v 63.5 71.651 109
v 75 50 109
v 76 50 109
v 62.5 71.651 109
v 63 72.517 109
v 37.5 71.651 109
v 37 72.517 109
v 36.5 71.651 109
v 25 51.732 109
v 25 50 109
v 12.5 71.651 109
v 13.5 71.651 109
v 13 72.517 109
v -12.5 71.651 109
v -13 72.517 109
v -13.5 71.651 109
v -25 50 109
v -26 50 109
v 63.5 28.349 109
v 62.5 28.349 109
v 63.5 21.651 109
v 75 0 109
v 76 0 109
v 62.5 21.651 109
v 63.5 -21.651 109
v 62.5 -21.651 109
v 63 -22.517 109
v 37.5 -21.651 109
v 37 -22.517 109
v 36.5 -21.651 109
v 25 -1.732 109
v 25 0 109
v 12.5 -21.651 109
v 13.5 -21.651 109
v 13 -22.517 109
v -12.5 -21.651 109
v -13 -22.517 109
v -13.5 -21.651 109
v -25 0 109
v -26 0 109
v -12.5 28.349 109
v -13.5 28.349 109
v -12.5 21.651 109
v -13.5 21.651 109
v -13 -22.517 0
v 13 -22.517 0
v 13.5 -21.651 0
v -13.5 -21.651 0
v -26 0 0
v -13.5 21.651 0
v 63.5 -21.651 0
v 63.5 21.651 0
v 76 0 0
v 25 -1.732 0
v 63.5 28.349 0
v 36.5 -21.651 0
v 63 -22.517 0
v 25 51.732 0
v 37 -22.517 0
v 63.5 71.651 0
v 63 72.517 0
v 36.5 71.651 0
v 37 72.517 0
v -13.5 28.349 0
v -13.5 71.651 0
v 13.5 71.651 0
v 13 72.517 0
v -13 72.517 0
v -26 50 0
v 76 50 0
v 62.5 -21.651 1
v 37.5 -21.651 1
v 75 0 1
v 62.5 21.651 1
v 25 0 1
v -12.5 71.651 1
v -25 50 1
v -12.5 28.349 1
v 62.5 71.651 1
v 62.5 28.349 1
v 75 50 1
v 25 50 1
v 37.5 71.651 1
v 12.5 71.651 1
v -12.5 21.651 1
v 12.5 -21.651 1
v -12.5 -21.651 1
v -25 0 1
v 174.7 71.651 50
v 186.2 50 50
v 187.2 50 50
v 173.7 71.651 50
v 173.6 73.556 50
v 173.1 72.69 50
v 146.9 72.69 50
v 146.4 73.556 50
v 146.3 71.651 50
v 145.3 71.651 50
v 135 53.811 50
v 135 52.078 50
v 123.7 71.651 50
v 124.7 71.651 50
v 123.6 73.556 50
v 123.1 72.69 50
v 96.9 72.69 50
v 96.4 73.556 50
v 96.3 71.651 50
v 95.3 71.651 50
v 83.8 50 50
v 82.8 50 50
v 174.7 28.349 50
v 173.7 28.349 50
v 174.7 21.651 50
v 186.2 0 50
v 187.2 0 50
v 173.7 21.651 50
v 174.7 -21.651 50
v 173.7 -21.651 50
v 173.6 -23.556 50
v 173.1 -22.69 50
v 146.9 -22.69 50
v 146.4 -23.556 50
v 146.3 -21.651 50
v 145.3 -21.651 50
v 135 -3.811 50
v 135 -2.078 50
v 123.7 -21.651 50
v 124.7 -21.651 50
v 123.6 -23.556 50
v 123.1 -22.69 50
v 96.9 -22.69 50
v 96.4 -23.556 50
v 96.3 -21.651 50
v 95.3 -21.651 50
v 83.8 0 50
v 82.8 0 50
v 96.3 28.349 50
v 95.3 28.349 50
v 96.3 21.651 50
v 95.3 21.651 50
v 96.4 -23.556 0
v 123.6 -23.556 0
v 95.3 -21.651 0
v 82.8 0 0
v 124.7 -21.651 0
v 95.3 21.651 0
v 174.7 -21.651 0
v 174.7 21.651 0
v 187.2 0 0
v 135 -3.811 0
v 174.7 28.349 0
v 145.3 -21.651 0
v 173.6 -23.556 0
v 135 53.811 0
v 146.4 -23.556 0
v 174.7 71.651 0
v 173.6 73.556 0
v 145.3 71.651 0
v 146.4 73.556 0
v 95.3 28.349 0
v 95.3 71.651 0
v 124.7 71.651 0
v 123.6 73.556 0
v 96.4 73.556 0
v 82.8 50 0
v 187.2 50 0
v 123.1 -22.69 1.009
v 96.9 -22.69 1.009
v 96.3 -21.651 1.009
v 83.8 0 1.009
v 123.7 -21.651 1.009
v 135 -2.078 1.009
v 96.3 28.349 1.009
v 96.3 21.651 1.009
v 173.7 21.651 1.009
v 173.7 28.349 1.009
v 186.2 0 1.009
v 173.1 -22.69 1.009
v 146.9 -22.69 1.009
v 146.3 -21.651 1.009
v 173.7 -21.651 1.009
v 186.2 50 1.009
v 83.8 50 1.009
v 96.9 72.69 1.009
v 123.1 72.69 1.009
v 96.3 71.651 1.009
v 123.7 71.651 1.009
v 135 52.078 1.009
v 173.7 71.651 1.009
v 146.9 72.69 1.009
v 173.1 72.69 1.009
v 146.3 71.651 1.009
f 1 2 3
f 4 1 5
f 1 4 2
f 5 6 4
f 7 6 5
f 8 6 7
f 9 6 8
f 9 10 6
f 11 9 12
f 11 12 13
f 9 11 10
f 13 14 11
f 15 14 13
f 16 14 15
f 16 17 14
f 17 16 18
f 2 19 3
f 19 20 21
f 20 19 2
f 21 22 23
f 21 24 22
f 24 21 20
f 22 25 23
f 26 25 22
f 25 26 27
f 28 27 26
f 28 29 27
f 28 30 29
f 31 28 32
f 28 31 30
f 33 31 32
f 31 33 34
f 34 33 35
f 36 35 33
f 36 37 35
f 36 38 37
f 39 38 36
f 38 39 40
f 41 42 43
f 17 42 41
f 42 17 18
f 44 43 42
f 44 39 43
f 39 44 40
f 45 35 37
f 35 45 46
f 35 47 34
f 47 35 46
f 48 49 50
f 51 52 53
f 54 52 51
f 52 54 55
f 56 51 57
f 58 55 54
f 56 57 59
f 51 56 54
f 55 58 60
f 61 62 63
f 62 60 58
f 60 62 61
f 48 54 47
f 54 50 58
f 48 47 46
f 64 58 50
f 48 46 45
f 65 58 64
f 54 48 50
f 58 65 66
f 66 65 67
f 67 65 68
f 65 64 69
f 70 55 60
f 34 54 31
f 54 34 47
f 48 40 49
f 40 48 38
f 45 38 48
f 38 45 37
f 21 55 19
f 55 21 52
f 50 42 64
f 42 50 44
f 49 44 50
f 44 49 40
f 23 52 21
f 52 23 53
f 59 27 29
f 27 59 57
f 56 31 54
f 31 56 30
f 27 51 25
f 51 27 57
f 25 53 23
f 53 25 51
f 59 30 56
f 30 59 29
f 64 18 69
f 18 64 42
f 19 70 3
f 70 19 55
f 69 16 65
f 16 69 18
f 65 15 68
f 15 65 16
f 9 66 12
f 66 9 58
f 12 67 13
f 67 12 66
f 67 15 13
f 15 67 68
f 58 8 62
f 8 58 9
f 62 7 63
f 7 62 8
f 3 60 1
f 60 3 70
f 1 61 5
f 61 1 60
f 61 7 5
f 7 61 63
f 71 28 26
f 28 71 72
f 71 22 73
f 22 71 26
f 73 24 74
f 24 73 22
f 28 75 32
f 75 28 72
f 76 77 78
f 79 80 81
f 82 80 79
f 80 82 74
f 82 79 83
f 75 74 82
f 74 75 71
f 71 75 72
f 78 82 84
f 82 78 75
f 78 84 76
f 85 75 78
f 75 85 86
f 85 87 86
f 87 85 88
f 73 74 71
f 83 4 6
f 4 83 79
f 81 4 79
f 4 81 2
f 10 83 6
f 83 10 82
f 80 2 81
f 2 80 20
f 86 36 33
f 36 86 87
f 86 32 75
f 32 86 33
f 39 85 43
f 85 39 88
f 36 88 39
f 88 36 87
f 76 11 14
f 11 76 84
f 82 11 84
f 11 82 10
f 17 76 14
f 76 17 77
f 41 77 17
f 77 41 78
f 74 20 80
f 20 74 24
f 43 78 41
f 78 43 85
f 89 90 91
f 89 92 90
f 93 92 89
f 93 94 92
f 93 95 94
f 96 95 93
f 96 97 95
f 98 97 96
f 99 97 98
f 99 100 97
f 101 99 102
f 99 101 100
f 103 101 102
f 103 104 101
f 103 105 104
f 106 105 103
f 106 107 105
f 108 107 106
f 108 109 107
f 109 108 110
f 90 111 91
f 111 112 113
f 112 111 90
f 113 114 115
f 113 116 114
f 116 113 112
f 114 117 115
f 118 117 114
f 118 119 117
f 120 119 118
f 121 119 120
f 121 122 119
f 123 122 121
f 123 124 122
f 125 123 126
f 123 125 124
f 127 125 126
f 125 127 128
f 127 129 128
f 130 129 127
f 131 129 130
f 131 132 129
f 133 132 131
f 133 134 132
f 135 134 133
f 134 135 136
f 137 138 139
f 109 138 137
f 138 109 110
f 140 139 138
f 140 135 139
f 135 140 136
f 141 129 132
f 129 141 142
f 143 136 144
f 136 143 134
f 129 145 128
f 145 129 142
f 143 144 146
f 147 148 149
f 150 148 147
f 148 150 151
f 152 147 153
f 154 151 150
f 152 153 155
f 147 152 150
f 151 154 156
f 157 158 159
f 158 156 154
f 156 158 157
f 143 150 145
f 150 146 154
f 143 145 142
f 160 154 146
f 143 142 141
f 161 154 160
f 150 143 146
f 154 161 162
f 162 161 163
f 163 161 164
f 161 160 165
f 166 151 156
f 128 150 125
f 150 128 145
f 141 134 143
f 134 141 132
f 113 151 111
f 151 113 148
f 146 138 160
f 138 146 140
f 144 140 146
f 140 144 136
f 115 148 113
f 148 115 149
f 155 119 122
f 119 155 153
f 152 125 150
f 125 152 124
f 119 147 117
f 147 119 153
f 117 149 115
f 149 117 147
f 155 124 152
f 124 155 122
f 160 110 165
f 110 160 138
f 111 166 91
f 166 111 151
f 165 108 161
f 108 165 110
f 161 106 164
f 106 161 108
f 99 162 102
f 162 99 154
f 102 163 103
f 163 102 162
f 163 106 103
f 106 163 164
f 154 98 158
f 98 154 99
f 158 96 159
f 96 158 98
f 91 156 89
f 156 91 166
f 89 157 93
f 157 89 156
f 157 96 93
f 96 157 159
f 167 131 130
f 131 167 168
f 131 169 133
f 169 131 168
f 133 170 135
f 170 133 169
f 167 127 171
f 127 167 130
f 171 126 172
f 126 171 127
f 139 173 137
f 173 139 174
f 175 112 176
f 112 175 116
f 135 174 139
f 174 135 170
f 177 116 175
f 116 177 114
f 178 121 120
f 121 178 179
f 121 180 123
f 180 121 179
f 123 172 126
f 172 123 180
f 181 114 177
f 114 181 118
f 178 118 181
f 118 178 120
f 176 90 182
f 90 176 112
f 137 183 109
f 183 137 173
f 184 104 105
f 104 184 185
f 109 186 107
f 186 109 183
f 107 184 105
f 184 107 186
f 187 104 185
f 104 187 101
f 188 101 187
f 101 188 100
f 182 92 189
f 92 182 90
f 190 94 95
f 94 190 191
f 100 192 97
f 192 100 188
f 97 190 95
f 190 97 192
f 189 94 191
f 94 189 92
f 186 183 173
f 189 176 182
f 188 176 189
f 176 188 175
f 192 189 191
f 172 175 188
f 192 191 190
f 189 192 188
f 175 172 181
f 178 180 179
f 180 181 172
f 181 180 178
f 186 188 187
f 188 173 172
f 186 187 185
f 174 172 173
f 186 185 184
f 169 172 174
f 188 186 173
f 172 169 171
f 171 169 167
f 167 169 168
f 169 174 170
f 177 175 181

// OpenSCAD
stone_height = 12;
stones = 9;
stone_radius = 50 / 2;
thickness = 1;
tolerance = 0.2;
overlap = 50;

module single_column() {
	cylinder(r=stone_radius, h=stone_height * stones + thickness, $fn=6);
}
module stones_shape() {
	single_column();
	translate([stone_radius * 2, 0, 0]) {
		single_column();
		translate([0, stone_radius * 2, 0]) {
			single_column();
		}
	}
	translate([0, stone_radius * 2, 0]) {
		single_column();
	}
	translate([-stone_radius * sin(30), 0, 0]) {
		cube([stone_radius * (2 + sin(30) * 2), stone_radius * 2, stone_height * stones + thickness]);
	}
}

difference() {
	minkowski() {
		stones_shape();
		scale([1, 1, 0]) {
			cylinder(r=thickness, h=1, $fn=6);
		}
	}
	translate([0, 0, thickness]) {
		stones_shape();
	}
}

translate([stone_radius * 4 + 10, 0, 0]) {
	scale([1, 1, overlap / (stone_height * stones + thickness)]) {
		difference() {
			minkowski() {
				stones_shape();
				scale([1, 1, 0]) {
					cylinder(r = thickness * 2 + tolerance, h=1, $fn=6);
				}
			}
			minkowski() {
				stones_shape();
				scale([1, 1, 0]) {
					cylinder(r=tolerance + thickness, h=1, $fn=6);
				}
			}
		}
	}
	scale([1, 1, thickness / (stone_height * stones + thickness)]) {
		minkowski() {
			stones_shape();
			cylinder(r=thickness * 2 + tolerance, h=1, $fn=6);
		}
	}
}
